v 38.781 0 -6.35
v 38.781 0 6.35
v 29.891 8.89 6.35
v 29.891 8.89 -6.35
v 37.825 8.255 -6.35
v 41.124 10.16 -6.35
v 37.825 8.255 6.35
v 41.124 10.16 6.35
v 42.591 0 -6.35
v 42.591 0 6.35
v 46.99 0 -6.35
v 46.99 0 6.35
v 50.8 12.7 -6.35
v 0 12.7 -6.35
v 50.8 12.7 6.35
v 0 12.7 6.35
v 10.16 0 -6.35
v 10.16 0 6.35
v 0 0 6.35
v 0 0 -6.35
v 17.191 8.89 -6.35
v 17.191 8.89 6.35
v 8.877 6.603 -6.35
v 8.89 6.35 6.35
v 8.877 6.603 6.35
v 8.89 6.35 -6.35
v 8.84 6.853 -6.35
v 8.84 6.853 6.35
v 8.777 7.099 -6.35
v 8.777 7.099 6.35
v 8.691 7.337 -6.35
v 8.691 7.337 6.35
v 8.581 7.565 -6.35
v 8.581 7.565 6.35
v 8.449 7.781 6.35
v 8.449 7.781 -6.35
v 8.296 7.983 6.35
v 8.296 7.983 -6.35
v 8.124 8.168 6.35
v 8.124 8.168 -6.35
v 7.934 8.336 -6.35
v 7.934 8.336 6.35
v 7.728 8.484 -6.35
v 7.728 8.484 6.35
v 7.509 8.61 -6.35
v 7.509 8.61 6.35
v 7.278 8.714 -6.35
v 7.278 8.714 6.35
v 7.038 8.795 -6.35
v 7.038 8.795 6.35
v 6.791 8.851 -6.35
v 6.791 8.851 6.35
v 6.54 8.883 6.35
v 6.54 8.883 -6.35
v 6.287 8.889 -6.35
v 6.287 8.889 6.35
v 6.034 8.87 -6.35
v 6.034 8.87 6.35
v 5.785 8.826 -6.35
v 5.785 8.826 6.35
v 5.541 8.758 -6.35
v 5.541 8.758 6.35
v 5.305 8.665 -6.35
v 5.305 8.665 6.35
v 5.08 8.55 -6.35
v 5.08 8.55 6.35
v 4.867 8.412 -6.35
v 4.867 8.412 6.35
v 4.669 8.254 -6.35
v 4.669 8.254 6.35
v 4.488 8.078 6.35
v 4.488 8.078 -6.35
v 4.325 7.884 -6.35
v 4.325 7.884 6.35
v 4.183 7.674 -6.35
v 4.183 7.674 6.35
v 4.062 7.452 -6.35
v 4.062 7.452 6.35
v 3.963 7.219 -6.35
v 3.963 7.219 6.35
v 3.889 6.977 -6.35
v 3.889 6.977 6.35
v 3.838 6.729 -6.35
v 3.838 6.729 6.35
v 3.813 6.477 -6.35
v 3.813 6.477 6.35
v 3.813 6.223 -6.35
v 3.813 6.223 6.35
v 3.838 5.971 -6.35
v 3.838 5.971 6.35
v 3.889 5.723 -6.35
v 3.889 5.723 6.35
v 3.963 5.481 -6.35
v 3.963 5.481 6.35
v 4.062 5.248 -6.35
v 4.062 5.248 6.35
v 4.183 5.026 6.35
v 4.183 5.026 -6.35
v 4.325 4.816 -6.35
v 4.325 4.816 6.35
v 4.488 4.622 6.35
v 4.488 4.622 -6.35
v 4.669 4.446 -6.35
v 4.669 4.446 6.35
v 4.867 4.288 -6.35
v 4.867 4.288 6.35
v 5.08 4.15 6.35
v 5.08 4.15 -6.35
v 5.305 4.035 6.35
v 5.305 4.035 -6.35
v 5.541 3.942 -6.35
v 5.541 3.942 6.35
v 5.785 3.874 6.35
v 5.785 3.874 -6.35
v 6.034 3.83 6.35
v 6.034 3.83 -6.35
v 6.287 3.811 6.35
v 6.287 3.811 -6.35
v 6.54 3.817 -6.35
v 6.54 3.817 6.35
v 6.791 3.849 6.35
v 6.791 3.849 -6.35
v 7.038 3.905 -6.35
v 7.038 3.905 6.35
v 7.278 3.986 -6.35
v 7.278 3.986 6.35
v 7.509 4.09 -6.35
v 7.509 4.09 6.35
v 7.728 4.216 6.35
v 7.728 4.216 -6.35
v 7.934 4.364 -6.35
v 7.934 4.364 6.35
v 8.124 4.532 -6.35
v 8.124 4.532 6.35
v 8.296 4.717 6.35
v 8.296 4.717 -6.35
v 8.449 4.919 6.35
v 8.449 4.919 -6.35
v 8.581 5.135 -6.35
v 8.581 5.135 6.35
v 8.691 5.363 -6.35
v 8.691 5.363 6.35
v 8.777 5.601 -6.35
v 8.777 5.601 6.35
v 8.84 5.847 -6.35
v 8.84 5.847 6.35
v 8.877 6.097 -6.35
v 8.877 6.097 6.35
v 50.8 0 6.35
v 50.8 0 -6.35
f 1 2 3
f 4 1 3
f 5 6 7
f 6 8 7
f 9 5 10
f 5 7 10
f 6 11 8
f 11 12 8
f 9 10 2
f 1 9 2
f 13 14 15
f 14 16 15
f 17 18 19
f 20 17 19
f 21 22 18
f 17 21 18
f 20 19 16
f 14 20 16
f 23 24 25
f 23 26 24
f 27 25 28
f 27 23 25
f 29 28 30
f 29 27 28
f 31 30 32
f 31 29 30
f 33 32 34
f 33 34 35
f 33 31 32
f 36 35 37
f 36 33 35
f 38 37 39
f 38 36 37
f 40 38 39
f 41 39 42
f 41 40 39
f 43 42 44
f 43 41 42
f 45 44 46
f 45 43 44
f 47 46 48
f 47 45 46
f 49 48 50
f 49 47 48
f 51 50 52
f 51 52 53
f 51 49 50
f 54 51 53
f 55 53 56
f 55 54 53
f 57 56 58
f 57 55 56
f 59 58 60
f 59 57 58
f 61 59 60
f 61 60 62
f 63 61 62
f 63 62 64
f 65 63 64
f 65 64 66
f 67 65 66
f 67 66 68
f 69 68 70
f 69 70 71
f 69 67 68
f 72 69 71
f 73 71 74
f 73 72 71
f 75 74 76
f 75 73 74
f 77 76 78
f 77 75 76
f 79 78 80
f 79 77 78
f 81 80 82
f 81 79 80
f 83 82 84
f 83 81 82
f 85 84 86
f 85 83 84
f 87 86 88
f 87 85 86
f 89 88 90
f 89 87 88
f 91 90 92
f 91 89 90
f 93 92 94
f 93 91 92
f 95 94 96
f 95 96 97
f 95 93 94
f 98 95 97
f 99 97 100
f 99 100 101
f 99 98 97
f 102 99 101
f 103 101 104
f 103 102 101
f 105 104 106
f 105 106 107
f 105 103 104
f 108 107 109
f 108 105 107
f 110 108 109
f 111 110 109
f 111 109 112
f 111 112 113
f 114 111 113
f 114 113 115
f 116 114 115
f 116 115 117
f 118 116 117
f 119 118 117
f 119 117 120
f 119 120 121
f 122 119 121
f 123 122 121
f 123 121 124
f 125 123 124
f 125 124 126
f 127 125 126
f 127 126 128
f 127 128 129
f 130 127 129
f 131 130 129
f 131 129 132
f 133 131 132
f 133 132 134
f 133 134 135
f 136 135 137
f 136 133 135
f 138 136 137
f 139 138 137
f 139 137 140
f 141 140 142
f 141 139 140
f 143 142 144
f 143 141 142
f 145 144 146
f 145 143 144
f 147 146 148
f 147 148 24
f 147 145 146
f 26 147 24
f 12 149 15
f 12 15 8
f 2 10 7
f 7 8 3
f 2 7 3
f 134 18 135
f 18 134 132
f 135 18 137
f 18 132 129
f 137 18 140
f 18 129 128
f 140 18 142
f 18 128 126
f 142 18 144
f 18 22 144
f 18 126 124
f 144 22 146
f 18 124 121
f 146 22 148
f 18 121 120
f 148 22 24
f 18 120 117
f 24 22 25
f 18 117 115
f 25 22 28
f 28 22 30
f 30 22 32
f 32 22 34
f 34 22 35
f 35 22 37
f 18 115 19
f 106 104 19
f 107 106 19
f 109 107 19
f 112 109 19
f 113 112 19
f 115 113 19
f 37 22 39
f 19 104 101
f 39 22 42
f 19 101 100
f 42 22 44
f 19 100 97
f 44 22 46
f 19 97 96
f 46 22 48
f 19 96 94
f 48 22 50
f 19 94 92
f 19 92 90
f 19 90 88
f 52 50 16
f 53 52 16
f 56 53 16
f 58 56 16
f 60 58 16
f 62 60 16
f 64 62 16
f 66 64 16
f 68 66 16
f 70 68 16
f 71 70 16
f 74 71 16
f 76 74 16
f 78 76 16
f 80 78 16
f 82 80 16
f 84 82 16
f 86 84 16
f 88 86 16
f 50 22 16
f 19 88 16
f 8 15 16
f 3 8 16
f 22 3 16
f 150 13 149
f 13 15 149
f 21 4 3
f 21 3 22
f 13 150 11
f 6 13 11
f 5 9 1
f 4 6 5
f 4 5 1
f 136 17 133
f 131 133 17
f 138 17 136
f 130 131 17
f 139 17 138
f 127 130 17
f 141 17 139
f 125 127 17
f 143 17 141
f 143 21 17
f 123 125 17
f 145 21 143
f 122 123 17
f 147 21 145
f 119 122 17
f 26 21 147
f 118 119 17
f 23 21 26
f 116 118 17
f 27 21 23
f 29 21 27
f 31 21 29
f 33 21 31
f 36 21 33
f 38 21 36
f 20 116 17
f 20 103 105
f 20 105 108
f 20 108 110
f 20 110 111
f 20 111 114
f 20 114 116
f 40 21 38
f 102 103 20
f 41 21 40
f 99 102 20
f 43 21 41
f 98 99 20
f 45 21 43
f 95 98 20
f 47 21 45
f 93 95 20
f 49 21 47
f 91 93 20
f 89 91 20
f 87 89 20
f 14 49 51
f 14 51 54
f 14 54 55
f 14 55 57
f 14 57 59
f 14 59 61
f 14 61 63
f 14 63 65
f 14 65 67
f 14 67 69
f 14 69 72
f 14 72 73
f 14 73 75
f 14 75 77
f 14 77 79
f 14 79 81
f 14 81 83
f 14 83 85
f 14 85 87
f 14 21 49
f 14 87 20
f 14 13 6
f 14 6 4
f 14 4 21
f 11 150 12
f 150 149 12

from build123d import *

# Parameters (mm, degrees)
SKETCH2_R           = 2.54
BOSS_EXTRUDE1_DEPTH = 6.35


with BuildPart() as part:
    # Sketch2 → Boss-Extrude1 (new, symmetric)
    with BuildSketch(Plane.XY):
        Polygon((0, 0), (0, 12.7), (50.8, 12.7), (50.8, 0), (46.99, 0), (41.124121265, 10.16), (37.824564477, 8.255), (42.590590949, 0), (38.780590949, 0), (29.890590949, 8.89), (17.190590949, 8.89), (10.16, 0), align=None)
        with Locations((6.35, 6.35)):
            Circle(SKETCH2_R, mode=Mode.SUBTRACT)
    extrude(amount=BOSS_EXTRUDE1_DEPTH, both=True)


solid = part.part
